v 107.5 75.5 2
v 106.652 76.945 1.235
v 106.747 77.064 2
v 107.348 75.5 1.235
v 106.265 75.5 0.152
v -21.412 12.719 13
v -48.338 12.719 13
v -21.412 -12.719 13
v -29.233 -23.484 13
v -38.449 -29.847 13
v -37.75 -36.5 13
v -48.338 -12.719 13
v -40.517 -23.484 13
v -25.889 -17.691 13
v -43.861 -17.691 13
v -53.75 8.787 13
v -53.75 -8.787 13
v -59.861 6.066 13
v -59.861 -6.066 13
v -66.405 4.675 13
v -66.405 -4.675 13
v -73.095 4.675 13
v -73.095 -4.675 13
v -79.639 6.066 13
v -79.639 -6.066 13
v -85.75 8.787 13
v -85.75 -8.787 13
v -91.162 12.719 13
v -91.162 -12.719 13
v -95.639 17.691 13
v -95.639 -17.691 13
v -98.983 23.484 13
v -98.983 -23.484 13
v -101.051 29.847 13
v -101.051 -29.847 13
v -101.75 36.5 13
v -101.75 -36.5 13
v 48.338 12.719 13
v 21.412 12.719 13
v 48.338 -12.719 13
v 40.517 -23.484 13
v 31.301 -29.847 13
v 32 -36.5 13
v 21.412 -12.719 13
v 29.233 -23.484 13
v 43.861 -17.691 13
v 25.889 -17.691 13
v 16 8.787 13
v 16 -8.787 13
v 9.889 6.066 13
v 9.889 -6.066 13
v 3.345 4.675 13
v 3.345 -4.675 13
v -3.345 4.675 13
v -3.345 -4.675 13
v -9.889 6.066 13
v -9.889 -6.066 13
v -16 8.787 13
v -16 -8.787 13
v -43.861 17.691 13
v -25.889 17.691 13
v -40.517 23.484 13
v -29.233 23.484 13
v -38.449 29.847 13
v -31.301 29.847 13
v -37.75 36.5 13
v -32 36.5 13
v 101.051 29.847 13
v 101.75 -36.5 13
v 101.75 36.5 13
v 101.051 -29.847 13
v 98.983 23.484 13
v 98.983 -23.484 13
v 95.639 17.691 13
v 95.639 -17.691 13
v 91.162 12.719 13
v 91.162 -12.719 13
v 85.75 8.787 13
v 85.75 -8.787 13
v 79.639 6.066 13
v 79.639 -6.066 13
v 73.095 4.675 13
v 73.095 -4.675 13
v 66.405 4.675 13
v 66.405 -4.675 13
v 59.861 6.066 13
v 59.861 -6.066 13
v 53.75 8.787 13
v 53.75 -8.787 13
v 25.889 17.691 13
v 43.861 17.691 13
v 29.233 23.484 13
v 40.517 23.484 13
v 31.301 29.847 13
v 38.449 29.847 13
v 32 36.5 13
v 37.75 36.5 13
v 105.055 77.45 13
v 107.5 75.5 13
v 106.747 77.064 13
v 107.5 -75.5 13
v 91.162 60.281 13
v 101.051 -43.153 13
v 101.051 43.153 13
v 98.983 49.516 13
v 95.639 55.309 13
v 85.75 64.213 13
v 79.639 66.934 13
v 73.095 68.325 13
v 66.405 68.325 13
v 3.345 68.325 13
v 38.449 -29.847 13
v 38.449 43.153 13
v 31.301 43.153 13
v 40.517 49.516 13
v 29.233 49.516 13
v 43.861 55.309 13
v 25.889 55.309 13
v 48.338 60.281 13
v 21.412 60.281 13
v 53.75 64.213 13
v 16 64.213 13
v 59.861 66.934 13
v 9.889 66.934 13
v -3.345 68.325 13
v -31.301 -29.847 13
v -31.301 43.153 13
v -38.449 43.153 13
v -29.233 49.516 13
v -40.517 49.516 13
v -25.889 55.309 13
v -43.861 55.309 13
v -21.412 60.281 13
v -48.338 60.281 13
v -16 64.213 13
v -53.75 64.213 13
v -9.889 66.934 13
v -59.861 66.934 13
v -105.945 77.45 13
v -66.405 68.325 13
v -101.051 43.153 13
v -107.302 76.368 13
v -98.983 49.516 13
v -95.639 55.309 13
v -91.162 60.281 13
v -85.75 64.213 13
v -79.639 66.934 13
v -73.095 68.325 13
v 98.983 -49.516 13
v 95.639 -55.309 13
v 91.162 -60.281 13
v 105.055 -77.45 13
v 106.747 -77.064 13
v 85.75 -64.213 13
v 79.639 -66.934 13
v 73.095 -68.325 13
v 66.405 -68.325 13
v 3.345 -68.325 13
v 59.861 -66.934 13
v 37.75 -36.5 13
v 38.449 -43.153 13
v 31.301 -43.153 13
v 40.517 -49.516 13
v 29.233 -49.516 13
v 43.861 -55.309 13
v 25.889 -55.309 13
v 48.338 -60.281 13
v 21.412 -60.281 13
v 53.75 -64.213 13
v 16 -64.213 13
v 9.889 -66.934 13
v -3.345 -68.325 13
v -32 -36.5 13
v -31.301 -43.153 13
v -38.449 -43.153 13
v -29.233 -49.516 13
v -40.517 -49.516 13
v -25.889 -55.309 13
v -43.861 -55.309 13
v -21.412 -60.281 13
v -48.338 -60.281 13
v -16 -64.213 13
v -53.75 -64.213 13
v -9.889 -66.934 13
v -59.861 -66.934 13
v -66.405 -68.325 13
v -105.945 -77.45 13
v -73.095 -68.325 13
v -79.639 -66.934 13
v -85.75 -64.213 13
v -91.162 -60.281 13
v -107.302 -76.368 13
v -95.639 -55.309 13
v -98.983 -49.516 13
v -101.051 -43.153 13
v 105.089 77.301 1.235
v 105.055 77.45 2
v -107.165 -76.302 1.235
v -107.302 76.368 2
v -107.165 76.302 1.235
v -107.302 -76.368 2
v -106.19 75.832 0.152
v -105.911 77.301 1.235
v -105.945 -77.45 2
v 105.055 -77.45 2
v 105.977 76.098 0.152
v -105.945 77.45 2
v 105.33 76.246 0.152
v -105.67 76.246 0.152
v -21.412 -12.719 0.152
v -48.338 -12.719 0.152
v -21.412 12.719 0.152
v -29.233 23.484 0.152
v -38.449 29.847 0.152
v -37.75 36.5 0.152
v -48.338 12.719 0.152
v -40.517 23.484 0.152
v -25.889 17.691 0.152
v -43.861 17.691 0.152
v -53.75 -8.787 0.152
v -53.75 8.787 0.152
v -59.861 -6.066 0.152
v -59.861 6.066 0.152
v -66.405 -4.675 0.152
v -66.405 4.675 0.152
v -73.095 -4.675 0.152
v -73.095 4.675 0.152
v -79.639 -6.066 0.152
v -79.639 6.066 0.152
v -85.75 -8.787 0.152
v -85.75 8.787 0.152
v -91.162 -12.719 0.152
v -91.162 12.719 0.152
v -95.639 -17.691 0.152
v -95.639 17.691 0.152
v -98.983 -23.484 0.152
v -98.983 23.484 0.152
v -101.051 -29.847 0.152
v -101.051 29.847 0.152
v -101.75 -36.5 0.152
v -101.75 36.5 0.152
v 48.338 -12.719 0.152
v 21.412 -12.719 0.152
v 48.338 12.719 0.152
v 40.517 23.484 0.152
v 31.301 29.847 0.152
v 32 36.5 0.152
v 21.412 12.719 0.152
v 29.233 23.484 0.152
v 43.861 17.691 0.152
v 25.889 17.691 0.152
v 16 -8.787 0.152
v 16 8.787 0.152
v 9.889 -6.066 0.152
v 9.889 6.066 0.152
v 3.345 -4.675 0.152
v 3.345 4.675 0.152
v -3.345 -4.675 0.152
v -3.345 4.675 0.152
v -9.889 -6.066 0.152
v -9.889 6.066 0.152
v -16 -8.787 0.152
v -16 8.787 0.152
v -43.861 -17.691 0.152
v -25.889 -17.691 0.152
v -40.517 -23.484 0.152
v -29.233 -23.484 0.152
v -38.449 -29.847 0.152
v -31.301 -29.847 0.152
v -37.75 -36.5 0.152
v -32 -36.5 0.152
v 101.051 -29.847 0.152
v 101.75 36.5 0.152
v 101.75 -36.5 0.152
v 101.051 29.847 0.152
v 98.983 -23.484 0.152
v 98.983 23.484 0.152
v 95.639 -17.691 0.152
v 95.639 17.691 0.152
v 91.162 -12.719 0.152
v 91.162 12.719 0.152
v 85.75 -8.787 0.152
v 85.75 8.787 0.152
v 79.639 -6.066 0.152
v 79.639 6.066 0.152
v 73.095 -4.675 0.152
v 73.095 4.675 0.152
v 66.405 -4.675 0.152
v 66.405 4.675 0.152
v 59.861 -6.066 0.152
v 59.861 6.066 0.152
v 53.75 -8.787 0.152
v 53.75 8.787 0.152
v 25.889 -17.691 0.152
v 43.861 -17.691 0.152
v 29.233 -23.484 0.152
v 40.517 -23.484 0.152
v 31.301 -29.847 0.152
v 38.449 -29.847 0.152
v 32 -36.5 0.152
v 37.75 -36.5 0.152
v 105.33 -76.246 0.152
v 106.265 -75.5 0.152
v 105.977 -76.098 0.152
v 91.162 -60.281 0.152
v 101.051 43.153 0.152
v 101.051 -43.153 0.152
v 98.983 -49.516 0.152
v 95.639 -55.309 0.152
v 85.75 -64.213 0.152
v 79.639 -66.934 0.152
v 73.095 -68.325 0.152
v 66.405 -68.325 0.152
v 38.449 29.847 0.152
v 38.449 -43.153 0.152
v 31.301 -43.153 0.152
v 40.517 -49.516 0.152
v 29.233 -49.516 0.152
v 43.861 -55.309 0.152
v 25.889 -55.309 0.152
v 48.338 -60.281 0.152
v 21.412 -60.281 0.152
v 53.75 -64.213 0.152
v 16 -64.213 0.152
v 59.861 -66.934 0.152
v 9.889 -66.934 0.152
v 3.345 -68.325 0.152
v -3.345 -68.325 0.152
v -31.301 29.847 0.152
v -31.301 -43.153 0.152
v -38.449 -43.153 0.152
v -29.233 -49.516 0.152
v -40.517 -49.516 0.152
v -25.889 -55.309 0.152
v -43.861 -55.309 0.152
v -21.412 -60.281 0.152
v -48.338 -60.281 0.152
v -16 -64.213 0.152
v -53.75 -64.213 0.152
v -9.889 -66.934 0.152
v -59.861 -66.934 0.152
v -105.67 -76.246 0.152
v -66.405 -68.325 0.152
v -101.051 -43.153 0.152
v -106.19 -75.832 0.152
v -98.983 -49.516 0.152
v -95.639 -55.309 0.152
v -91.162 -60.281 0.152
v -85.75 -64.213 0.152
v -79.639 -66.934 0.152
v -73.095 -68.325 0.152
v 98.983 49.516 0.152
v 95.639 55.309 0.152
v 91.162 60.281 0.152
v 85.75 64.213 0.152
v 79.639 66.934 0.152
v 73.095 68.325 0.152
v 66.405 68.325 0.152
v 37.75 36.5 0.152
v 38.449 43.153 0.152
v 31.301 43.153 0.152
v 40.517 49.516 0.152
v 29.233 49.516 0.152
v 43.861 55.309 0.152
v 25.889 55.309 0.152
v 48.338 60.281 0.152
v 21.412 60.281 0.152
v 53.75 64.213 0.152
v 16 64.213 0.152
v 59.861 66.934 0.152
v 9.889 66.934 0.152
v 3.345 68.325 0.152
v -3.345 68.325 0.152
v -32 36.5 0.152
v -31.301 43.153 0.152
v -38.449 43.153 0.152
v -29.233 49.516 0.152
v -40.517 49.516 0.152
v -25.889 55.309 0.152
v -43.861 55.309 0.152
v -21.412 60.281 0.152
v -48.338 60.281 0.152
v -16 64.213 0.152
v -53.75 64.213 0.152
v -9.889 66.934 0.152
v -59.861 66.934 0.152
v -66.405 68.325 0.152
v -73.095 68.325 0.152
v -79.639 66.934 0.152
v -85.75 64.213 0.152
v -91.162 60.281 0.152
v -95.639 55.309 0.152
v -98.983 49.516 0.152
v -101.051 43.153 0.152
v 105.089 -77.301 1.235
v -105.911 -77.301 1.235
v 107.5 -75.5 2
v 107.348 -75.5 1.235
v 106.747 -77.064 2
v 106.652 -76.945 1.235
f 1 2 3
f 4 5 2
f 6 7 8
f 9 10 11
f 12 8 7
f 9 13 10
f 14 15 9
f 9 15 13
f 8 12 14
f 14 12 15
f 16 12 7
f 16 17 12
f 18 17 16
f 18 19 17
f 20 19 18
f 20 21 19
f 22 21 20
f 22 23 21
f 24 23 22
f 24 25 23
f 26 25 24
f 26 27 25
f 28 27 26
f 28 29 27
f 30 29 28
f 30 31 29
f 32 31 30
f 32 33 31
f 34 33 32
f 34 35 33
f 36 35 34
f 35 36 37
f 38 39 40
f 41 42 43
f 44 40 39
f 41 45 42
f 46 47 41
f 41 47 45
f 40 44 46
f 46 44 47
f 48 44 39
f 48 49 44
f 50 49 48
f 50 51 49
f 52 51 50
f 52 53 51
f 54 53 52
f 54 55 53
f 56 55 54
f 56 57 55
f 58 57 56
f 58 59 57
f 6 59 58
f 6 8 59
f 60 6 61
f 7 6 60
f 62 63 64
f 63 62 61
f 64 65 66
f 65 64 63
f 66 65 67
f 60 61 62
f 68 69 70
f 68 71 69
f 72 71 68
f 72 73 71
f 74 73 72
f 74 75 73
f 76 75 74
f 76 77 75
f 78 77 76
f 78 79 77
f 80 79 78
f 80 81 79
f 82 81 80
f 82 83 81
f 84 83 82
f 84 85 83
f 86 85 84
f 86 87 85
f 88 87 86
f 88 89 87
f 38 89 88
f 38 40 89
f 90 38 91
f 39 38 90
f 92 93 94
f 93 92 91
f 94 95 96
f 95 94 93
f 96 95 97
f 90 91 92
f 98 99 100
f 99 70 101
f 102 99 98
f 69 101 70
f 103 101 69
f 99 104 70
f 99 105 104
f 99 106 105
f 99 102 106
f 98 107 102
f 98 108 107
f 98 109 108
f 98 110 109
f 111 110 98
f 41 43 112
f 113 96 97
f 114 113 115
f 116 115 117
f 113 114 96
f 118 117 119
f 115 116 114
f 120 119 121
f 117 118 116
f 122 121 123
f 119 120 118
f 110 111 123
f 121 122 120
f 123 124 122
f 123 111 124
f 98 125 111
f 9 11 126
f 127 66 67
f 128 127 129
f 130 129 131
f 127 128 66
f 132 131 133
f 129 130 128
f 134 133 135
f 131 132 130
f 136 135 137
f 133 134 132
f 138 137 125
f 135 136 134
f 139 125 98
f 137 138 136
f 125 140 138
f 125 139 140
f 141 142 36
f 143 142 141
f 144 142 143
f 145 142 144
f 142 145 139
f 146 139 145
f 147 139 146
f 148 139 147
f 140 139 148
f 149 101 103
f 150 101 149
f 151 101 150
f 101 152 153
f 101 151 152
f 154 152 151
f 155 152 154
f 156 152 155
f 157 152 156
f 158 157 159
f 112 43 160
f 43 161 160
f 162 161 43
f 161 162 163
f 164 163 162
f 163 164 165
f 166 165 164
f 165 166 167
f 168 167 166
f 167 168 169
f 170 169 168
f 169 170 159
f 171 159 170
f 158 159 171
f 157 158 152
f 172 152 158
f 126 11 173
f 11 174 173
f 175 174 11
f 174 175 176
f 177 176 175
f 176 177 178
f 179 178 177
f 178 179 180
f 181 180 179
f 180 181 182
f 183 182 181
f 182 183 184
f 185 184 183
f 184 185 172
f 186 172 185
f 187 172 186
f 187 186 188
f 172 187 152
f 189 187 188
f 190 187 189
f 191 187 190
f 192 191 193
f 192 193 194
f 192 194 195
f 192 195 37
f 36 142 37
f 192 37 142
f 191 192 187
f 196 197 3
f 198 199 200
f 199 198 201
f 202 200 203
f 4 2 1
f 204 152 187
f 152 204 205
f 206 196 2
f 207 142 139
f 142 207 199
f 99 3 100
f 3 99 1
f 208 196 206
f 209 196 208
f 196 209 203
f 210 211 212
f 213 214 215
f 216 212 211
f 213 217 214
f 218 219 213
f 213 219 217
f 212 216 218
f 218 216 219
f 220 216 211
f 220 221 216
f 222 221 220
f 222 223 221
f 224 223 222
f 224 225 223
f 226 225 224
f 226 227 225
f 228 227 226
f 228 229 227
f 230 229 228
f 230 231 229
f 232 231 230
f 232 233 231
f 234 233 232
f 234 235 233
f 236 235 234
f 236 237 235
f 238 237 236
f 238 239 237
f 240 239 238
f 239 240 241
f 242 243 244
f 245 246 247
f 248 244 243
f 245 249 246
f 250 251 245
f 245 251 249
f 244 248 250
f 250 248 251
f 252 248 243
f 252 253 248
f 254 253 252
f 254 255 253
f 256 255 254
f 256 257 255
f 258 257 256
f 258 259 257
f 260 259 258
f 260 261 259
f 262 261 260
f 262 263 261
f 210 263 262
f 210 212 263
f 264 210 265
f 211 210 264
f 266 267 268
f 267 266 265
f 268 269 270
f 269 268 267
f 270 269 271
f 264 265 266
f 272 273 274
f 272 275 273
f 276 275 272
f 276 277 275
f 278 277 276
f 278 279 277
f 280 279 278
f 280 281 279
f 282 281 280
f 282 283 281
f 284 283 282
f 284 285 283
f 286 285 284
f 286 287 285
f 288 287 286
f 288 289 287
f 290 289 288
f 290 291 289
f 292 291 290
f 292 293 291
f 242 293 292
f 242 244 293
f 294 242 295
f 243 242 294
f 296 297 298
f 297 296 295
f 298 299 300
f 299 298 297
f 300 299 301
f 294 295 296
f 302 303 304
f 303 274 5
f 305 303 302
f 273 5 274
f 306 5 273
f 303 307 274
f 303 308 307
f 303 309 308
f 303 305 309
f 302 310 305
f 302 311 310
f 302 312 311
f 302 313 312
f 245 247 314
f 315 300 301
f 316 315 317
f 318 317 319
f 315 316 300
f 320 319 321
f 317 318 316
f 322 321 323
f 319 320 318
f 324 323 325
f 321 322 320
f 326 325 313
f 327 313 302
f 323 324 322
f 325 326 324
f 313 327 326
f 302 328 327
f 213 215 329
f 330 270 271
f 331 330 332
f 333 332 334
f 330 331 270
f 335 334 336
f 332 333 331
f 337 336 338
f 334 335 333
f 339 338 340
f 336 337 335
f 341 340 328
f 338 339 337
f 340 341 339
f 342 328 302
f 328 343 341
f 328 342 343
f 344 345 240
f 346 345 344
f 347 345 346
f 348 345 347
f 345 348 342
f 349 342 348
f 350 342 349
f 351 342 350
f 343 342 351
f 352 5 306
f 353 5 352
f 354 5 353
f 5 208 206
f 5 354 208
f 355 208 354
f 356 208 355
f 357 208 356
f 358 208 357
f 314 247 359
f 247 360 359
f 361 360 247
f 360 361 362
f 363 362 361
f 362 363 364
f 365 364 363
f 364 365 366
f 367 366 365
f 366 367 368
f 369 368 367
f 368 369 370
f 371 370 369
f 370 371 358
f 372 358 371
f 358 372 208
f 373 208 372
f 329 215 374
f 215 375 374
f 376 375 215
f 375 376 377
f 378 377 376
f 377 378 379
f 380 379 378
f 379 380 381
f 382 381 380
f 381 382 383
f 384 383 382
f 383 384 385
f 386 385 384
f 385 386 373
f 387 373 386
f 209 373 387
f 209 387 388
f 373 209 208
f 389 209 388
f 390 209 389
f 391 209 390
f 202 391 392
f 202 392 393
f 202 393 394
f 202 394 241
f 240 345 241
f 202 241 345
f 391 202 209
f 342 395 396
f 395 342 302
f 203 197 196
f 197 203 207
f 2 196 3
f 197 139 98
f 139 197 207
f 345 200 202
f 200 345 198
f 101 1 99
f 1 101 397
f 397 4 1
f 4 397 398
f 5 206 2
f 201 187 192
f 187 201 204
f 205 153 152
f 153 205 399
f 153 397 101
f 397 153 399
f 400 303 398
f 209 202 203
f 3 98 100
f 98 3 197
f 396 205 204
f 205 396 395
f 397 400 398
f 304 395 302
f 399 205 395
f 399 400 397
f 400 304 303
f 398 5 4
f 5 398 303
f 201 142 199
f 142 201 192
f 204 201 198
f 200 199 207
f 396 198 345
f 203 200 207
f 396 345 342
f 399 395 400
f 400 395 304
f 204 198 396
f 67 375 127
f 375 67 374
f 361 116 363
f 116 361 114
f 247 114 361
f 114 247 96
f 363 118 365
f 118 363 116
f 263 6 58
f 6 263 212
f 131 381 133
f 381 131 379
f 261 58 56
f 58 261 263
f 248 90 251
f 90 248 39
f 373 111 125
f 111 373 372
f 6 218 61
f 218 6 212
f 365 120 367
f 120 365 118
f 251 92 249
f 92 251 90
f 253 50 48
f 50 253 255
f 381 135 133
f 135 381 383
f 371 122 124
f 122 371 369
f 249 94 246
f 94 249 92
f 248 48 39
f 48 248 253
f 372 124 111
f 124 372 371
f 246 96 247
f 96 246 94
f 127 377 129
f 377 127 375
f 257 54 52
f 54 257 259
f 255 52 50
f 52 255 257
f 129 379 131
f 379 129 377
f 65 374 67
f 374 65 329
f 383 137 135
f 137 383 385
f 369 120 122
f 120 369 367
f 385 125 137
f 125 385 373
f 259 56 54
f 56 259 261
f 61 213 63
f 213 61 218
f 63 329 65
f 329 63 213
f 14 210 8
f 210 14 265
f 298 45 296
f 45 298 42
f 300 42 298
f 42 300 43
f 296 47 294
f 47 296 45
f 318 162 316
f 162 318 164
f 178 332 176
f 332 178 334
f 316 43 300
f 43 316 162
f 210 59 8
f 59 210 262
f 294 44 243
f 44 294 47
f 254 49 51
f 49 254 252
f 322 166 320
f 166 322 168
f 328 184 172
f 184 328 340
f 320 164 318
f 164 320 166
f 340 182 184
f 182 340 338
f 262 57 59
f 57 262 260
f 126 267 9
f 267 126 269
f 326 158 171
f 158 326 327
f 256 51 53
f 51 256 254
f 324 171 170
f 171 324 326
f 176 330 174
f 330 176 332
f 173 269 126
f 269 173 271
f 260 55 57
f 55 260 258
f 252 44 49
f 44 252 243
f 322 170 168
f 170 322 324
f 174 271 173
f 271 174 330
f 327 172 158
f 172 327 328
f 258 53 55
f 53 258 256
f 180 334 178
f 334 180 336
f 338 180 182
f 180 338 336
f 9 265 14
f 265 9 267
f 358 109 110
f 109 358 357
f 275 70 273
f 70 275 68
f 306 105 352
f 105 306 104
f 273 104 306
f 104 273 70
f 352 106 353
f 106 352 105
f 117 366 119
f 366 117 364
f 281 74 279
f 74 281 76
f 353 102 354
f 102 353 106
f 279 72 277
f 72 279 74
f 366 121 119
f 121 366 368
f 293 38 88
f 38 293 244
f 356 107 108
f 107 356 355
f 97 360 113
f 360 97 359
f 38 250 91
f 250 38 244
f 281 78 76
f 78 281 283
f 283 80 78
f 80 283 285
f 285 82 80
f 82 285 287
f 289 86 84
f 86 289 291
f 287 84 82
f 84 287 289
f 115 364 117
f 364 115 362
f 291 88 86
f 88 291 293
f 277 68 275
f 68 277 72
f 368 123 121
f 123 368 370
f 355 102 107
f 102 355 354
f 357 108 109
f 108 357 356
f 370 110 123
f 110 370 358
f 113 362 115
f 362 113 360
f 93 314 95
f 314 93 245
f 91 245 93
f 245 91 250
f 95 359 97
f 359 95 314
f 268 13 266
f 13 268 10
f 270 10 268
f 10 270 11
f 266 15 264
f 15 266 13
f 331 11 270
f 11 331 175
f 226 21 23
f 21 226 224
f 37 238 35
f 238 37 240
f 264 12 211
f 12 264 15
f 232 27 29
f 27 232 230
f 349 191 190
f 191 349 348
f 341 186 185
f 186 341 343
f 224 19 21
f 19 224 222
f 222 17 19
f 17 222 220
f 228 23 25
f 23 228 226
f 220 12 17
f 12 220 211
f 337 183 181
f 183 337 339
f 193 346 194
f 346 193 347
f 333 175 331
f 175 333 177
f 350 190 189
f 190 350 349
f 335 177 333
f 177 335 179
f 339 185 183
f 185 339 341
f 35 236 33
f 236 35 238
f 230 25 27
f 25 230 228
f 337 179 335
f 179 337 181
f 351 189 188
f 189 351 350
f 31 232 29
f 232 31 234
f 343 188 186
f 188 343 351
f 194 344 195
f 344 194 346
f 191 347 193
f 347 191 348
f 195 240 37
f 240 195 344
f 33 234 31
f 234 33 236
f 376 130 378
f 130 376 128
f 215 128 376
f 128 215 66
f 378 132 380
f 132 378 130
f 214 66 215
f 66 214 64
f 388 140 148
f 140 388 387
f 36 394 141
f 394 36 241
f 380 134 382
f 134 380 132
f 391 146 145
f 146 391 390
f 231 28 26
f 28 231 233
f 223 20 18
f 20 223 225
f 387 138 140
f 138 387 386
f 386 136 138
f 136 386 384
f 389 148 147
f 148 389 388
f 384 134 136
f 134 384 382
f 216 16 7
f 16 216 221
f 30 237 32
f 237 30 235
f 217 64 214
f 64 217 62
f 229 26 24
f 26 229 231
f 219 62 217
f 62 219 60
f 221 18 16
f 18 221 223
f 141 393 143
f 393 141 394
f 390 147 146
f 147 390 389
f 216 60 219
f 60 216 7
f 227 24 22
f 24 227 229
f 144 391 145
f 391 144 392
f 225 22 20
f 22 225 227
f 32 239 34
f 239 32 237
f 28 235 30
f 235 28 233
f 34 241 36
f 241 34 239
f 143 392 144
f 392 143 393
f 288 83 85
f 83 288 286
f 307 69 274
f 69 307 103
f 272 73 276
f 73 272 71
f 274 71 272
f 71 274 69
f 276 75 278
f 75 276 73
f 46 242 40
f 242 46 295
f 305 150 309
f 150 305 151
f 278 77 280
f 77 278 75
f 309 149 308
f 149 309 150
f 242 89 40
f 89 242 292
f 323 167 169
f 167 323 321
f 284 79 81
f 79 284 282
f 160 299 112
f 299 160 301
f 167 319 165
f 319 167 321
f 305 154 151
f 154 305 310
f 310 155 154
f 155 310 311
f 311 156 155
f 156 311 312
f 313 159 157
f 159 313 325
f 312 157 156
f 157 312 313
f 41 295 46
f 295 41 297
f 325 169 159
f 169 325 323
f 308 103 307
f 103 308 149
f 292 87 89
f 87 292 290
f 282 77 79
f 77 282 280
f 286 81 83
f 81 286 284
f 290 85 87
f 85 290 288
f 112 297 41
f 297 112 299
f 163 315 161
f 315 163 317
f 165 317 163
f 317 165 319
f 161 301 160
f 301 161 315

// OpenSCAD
h = 11; l = 215; b = 155; r = 32; rk = 2;
module Platte (){
hull(){
translate([l/2-rk, b/2-rk, rk], true){
    sphere(rk);
    cylinder (h, r=rk);}
translate([-(l/2-rk), b/2-rk, rk], true){
    sphere(rk);
    cylinder (h, r=rk);}
translate([-(l/2-rk), -(b/2-rk), rk], true){
    sphere(rk);
    cylinder (h, r=rk);}
translate([l/2-rk, -(b/2-rk), rk], true){
    sphere(rk);
    cylinder (h, r=rk);}
}
}

difference(){ 
    Platte ();
    translate([0, (b-4*r)/6+r, -h]) 
    cylinder (3*h, r=r, true);
    translate([0, -((b-4*r)/6+r), -5]) 
    cylinder (3*h, r=r, true);
    translate([(l-6*r)/4+2*r, (b-4*r)/6+r, -h]) 
    cylinder (3*h, r=r, true);
    translate([-((l-6*r)/4+2*r), -((b-4*r)/6+r), -h]) 
    cylinder (3*h, r=r, true);
    translate([-((l-6*r)/4+2*r), (b-4*r)/6+r, -h]) 
    cylinder (3*h, r=r, true);
    translate([(l-6*r)/4+2*r, -((b-4*r)/6+r), -h]) 
    cylinder (3*h, r=r, true);
}
